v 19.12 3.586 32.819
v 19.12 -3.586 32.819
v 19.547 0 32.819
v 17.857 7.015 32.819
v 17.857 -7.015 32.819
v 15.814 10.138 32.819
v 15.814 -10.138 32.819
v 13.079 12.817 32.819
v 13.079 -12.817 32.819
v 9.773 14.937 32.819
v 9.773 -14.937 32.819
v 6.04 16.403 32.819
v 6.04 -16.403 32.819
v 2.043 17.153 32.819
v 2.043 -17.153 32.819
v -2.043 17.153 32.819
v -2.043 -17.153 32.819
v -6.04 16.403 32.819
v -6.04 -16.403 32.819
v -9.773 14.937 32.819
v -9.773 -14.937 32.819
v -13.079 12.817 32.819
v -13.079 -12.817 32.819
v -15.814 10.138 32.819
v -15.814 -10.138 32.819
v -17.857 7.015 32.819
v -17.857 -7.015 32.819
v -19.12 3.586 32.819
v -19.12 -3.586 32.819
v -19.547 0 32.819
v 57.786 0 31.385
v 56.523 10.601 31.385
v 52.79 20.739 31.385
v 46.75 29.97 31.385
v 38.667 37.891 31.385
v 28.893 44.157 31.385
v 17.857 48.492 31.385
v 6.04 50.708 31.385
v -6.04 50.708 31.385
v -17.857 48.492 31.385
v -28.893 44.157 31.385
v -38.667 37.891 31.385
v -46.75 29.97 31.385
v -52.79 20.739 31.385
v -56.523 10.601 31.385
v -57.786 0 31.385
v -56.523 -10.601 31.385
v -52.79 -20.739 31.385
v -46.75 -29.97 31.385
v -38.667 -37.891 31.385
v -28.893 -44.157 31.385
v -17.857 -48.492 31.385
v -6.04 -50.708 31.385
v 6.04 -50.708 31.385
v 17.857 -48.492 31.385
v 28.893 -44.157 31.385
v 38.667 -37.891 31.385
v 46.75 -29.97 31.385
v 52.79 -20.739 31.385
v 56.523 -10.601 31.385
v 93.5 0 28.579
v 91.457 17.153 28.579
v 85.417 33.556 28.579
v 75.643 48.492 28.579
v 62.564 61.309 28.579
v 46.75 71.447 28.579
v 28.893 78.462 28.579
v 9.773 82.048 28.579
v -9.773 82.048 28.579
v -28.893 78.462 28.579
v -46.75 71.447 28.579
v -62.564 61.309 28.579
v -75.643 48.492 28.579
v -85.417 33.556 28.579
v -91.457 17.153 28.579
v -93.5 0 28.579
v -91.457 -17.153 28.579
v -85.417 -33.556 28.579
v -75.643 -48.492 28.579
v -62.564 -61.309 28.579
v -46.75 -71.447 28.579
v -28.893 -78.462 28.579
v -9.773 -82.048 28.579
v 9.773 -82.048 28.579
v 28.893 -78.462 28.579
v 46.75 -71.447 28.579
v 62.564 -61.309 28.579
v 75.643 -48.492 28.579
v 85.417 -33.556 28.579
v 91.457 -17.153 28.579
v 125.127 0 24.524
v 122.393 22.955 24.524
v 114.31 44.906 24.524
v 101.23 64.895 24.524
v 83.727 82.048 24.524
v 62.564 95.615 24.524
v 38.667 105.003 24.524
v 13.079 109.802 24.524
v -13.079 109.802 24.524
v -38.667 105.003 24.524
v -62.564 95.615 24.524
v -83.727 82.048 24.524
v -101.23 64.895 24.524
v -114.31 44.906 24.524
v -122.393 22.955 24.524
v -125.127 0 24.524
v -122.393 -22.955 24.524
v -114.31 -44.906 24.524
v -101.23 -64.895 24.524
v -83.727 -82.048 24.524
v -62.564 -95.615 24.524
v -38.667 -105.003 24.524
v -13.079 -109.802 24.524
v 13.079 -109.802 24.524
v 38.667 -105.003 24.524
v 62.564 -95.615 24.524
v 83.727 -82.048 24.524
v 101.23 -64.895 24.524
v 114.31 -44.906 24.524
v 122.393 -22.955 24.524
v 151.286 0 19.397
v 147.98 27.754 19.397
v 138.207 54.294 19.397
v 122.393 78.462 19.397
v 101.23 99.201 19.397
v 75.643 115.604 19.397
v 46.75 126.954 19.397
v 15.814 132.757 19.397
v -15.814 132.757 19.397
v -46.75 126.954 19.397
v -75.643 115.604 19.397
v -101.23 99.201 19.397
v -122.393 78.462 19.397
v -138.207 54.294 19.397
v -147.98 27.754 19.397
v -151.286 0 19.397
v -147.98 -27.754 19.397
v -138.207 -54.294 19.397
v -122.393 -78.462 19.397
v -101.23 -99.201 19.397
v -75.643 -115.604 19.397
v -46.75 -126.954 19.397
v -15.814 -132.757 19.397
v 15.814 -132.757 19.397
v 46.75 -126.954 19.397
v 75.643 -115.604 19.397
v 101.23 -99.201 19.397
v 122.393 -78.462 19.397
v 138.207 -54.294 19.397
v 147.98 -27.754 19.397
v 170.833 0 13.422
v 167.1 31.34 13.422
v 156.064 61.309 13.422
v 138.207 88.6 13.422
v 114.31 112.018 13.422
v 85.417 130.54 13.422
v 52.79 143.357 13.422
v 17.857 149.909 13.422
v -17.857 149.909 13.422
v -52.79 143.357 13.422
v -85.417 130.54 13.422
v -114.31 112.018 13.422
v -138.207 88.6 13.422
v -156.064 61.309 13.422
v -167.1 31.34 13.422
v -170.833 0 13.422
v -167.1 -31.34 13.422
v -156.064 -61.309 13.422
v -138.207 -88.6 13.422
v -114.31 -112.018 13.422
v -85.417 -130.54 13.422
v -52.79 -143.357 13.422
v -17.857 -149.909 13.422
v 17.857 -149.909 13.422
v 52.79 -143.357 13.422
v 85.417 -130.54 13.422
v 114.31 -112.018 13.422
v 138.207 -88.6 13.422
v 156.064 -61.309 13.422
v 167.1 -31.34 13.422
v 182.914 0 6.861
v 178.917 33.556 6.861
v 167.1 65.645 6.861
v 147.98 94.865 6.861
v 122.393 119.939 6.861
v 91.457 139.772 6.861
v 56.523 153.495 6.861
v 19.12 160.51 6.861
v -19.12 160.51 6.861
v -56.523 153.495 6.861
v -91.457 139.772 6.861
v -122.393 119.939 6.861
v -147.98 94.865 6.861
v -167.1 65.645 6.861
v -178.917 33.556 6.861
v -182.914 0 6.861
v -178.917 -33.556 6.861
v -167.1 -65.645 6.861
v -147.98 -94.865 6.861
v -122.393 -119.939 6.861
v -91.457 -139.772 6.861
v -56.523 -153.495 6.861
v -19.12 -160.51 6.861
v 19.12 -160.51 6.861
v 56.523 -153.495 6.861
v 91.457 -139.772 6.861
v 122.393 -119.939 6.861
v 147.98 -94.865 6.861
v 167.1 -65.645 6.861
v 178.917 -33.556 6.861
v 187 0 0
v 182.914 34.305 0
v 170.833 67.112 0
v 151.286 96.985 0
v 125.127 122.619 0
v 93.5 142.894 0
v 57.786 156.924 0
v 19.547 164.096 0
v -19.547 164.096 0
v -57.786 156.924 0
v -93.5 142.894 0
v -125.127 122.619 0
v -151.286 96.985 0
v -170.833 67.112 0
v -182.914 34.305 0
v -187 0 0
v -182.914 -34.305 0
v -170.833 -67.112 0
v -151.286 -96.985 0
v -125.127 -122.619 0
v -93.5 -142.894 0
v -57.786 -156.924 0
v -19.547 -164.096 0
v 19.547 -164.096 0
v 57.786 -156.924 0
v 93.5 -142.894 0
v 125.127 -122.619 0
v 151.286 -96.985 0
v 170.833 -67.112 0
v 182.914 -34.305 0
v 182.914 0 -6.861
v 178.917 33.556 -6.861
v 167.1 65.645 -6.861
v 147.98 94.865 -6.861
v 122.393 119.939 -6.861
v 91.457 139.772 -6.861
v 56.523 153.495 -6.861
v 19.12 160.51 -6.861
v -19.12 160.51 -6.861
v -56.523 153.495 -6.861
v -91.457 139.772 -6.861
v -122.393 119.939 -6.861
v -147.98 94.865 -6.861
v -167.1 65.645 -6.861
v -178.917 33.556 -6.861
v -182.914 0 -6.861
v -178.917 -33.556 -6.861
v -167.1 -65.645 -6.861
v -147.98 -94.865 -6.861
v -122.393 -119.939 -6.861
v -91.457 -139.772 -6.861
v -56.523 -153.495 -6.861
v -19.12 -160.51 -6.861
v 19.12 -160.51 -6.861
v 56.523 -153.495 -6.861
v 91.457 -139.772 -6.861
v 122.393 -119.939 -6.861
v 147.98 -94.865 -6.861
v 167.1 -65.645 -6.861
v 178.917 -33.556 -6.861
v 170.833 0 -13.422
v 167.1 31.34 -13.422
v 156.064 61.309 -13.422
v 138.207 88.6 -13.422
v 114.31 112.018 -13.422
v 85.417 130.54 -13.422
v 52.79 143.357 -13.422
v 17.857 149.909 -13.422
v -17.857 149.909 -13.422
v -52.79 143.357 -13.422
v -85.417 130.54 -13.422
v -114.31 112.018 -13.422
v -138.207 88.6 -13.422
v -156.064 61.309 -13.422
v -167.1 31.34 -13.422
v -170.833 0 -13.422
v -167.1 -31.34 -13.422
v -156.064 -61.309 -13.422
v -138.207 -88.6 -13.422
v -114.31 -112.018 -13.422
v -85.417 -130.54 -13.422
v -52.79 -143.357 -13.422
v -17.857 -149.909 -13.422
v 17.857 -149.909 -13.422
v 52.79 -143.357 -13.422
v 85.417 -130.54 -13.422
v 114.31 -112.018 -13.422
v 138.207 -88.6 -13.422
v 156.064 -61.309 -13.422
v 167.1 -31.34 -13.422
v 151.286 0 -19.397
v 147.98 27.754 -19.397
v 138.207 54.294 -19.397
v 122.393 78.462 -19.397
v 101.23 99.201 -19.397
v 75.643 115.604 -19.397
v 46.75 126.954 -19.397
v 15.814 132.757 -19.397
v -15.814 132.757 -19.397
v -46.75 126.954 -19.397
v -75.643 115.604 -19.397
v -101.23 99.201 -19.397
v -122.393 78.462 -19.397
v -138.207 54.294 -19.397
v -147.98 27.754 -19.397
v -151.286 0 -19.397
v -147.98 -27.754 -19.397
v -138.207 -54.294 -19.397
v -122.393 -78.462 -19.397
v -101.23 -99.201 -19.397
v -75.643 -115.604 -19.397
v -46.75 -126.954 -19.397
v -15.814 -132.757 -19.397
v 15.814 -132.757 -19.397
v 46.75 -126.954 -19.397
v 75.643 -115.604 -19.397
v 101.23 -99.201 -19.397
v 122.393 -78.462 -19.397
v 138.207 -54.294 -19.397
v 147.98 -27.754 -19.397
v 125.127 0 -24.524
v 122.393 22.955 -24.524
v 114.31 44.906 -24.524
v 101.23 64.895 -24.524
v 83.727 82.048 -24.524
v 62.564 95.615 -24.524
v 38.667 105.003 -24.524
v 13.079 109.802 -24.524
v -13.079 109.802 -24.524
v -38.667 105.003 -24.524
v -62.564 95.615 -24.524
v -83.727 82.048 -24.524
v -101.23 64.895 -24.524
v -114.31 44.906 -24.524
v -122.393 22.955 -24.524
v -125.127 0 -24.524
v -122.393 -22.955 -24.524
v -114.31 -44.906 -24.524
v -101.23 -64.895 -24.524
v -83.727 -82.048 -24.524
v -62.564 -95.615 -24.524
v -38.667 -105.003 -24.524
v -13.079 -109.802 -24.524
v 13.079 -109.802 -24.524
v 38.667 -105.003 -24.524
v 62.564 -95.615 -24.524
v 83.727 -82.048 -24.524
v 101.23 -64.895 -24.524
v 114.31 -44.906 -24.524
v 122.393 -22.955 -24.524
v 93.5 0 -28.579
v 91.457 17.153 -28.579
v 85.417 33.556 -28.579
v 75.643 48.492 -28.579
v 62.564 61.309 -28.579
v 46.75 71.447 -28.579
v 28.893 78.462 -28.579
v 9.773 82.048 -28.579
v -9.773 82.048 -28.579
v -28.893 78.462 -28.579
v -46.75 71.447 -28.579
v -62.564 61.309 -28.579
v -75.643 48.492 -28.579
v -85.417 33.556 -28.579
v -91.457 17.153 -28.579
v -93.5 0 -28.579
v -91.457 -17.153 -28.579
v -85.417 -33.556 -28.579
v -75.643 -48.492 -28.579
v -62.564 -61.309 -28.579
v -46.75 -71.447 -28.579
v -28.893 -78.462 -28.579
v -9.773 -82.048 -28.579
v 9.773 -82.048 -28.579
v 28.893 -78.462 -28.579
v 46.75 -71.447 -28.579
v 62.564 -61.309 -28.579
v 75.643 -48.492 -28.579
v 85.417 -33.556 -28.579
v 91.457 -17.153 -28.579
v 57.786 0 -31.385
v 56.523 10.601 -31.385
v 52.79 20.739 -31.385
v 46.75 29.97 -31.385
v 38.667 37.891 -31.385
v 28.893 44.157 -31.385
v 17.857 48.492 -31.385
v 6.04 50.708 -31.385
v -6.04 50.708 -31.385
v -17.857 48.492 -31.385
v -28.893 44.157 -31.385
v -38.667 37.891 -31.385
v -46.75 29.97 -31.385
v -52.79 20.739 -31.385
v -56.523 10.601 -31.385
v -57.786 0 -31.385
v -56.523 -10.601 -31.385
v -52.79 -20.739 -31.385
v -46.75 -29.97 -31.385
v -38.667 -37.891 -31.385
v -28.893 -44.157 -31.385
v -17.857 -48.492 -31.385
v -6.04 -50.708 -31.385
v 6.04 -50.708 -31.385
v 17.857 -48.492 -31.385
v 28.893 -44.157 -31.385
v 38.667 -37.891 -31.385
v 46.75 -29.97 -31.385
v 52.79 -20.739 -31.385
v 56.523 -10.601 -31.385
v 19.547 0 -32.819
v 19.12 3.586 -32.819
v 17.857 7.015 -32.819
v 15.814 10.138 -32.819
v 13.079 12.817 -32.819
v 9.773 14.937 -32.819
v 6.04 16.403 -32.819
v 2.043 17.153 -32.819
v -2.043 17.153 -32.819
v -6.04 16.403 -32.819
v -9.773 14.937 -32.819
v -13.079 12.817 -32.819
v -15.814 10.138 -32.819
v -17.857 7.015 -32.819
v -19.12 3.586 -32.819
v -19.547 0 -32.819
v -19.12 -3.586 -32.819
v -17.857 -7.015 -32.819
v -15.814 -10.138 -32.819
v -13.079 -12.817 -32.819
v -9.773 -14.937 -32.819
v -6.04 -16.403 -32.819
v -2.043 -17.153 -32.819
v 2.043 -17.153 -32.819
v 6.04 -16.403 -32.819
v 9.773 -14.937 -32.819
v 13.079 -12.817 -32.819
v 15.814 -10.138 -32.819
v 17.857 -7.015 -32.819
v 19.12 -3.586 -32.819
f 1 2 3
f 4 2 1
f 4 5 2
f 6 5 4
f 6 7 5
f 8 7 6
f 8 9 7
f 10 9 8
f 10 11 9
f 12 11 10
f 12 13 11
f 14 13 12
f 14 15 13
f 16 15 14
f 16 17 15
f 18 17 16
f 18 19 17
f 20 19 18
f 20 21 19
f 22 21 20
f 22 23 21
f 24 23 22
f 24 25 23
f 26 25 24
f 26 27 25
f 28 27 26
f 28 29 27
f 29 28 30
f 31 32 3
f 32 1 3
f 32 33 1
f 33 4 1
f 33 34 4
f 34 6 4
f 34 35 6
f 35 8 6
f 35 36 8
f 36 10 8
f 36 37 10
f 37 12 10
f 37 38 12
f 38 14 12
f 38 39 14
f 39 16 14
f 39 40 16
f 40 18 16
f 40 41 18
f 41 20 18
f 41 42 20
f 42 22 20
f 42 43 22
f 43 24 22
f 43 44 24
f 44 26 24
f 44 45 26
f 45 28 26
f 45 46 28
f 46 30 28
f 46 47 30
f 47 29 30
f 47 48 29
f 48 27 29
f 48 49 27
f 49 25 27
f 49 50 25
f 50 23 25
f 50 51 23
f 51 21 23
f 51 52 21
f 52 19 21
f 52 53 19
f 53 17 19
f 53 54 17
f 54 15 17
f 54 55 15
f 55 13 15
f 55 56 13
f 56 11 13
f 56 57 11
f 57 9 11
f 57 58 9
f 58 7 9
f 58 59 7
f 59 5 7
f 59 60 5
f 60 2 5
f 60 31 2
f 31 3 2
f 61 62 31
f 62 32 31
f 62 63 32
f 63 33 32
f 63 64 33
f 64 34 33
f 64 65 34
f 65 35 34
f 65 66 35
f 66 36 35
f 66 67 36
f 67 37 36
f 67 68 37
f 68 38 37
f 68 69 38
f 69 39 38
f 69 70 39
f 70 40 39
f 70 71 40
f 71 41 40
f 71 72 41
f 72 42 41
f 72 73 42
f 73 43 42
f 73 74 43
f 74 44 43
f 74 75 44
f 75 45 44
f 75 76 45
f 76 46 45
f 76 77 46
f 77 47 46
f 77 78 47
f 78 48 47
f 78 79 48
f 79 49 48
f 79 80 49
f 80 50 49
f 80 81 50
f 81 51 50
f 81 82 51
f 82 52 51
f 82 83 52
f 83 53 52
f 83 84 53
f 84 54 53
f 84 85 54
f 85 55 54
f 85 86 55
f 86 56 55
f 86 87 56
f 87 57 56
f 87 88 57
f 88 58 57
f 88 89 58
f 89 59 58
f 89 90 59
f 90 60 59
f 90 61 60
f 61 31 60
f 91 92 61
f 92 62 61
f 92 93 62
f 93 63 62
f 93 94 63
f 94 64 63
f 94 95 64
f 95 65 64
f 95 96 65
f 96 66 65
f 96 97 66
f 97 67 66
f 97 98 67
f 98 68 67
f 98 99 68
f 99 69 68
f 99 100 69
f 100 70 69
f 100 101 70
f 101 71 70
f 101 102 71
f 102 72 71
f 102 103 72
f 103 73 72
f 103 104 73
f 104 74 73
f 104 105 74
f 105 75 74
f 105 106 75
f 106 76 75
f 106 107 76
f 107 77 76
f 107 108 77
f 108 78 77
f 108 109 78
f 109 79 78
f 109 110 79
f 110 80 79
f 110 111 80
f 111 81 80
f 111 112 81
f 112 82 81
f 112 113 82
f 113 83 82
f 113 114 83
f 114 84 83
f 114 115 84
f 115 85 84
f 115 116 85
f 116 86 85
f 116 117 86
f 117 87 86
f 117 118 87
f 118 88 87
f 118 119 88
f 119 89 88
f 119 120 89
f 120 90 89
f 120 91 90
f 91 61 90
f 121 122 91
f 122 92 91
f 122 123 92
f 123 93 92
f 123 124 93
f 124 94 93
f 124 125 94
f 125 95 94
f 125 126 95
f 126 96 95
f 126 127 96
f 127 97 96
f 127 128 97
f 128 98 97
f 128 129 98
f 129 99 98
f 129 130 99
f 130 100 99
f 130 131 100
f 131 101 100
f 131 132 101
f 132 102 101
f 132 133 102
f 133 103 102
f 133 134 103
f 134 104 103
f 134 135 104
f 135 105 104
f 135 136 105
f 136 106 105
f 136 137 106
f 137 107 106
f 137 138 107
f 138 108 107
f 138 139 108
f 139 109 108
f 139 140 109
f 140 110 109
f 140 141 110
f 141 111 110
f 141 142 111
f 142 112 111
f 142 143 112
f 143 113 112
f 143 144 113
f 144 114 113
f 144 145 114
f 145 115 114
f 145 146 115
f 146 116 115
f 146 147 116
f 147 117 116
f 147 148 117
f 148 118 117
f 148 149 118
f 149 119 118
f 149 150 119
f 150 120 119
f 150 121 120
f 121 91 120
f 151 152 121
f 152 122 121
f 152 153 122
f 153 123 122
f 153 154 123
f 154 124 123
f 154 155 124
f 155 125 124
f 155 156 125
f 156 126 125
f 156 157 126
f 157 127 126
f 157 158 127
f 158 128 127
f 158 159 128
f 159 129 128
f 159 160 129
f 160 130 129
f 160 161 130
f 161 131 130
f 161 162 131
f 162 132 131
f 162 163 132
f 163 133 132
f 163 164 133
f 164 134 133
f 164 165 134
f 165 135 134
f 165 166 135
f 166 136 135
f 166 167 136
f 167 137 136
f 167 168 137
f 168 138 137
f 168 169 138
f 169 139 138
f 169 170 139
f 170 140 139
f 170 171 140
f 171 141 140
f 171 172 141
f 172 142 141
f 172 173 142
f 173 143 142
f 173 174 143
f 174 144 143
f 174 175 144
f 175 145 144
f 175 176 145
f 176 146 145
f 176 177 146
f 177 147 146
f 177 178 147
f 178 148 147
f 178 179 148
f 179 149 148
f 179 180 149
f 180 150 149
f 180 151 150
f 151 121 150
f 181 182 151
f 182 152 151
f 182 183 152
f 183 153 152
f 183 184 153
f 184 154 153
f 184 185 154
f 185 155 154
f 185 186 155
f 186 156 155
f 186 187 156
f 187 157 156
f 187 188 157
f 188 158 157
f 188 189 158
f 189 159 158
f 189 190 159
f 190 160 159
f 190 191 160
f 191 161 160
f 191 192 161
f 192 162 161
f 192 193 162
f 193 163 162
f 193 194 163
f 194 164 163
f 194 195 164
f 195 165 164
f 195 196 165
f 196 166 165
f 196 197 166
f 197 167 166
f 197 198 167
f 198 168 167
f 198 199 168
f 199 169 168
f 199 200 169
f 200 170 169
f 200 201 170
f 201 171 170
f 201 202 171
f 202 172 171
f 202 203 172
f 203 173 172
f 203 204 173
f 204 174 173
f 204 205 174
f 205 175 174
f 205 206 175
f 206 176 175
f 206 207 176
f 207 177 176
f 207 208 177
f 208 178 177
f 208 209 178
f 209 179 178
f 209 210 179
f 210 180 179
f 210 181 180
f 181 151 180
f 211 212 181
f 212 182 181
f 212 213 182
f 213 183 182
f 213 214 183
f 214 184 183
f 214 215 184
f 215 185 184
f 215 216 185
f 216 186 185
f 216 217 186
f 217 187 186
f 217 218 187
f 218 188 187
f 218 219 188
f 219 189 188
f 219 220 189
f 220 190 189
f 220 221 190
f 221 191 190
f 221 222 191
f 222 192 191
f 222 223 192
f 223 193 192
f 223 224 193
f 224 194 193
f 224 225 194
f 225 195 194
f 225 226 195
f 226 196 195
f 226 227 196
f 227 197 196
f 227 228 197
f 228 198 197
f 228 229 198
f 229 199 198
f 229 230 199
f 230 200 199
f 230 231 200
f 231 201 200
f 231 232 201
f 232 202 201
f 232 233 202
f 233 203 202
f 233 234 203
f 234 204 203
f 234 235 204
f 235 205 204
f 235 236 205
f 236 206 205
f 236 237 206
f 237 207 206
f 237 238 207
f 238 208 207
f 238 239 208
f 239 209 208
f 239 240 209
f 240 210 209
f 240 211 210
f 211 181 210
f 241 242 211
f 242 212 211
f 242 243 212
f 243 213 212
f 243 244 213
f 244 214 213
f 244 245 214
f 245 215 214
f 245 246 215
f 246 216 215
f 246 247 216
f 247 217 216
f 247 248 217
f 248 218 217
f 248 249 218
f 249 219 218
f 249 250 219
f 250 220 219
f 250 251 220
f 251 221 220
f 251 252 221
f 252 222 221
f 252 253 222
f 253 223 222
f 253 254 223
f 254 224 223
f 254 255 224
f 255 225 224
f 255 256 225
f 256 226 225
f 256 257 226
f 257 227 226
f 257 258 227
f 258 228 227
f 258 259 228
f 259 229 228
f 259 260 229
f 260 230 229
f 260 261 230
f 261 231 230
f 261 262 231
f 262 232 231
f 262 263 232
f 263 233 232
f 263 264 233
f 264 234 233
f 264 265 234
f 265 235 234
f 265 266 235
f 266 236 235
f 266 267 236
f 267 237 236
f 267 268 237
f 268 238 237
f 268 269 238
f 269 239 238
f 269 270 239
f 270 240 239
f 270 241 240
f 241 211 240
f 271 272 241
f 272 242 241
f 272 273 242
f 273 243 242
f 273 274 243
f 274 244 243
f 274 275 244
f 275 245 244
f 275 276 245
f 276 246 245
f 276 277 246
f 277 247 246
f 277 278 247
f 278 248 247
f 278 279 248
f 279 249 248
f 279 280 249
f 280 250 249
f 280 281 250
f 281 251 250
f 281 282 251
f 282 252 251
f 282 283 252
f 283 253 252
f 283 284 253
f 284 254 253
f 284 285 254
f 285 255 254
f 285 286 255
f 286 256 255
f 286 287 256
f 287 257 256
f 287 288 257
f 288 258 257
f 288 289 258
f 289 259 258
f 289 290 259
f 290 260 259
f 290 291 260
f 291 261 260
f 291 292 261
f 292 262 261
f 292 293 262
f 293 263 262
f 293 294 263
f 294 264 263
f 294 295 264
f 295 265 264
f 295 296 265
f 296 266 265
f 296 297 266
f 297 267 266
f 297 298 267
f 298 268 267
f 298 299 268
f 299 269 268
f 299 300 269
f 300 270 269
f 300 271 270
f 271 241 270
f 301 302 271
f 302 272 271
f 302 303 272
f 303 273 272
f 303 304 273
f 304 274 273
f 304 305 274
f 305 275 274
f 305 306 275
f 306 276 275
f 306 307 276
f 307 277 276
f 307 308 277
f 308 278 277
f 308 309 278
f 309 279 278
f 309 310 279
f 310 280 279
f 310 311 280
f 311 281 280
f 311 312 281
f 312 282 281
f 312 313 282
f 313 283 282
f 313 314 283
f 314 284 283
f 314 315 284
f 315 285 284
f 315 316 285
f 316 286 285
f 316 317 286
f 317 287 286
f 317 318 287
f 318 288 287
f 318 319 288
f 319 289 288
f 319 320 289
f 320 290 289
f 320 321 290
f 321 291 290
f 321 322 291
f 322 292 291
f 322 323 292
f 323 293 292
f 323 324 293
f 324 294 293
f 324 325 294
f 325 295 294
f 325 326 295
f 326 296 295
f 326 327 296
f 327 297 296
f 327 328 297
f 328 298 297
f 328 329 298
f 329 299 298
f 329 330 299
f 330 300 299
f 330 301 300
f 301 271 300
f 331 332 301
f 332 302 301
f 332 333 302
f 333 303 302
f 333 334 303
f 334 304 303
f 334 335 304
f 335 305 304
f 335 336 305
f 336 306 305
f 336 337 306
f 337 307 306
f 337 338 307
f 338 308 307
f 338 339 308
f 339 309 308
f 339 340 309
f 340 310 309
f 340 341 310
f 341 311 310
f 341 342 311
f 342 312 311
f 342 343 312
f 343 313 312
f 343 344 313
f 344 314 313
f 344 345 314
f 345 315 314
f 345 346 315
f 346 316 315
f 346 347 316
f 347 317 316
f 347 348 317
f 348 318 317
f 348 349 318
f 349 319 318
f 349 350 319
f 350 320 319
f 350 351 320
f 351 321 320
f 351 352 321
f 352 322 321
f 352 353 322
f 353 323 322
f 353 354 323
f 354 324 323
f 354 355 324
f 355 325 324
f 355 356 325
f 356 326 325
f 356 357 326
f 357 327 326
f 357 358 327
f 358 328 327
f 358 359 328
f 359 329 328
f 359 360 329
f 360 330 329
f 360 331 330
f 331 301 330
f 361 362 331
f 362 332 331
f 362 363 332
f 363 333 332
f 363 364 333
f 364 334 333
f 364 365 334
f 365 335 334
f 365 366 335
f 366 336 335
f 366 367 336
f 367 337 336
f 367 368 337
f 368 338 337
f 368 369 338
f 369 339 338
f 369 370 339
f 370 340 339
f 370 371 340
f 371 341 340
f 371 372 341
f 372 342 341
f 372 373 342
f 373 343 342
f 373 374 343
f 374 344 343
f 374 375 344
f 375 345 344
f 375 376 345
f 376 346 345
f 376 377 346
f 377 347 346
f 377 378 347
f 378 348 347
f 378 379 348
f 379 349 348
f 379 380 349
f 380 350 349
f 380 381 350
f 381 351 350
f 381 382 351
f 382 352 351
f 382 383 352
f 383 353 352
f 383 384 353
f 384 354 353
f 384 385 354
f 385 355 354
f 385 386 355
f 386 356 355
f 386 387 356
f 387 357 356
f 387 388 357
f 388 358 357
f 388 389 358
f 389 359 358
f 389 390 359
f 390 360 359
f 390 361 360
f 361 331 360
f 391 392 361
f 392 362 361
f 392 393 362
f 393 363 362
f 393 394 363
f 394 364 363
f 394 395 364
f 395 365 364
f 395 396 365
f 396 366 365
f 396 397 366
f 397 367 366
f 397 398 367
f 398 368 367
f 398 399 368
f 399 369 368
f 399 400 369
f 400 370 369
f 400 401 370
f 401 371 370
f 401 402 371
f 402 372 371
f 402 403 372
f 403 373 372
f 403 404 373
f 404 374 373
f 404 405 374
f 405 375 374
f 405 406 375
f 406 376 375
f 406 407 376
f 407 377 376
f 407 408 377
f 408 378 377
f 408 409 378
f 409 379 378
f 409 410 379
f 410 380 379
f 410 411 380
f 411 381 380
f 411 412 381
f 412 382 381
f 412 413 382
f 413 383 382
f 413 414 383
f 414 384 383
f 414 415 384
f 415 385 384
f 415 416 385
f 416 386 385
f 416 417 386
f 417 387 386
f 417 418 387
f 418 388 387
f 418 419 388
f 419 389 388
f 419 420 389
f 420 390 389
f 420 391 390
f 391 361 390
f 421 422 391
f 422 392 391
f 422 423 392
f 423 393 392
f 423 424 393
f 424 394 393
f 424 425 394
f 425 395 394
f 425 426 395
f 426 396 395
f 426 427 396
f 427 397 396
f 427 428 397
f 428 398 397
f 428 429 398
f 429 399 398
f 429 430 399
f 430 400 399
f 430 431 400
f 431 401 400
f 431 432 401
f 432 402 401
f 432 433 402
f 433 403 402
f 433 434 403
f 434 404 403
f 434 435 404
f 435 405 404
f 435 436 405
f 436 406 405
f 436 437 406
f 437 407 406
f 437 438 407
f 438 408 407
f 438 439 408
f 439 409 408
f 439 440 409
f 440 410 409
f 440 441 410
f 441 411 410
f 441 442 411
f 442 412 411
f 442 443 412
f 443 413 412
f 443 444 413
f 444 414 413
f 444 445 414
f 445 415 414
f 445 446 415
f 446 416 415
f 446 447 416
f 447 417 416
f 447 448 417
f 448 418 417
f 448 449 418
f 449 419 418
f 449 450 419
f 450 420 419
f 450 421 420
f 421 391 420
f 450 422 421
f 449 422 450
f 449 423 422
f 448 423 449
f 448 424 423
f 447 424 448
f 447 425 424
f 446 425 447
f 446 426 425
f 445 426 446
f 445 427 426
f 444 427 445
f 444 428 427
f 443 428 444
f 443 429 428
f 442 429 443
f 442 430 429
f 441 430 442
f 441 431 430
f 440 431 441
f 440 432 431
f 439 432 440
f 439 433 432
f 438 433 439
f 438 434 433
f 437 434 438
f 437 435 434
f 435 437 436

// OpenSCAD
// Generated by SolidPython 1.0.1 on 2020-07-29 00:46:53


scale(v = [17, 15, 3]) {
	sphere(r = 11);
}
/***********************************************
*********      SolidPython code:      **********
************************************************
 
# import packages: SolidPython
from solid import *
from solid.utils import *
from itertools import chain, combinations, permutations


class Resize:

    def __init__(self, scad_file):
        self.scad_file = scad_file
        #self.scad_file = import_scad(scad_file)
        # cone/cylinder param:
        self.r1 = 0
        self.r2 = 0
        self.h = 0
        # rectangular prism param:
        self.w = 0
        self.l = 0
        # ellipse param:
        self.r = 0

    # import OpenScad code (file name corresponds to shape)


    # classify shape + parameters
    def assign(self, param1, param2, param3):
        if self.scad_file == 'cone.scad':
            self.r1 = param1
            self.r2 = param2
            self.h = param3
        elif self.scad_file == 'cylinder.scad':
            self.r1 = param1
            self.r2 = param2
            self.h = param3
        elif self.scad_file == 'rectangularPrism.scad':
            self.h = param1
            self.l = param2
            self.w = param3
        else:
            self.r = param1
            self.h = param2

    # resize parameters
    def iterate(self):
        x = range(3, 20, 2)
        i = 1
        if self.scad_file == 'cone.scad':
            tempList = list(permutations(x, 2))
            for temp in tempList:
                param1 = temp[0]
                param2 = temp[1]
                filepath = 'produced_scad_files/' + 'cone' + str(param1) + '_' + str(param2) + '_' + '.scad'
                scad_render_to_file(cylinder(h=param1, r1=param2, r2=0), filepath)

        elif self.scad_file == 'cylinder.scad':
            tempList = list(permutations(x, 3))
            for temp in tempList:
                param1 = temp[0]
                param2 = temp[1]
                filepath = 'produced_scad_files/' + 'cylinder' + str(param1) + '_' + str(param2) + '_' + '.scad'
                scad_render_to_file(cylinder(h=param1, r1=param2, r2=param2), filepath)

        elif self.scad_file == 'rectangularPrism.scad':
            tempList = list(permutations(x, 3))
            for temp in tempList:
                param1 = temp[0]
                param2 = temp[1]
                param3 = temp[2]
                filepath = 'produced_scad_files/' + 'rectangularPrism' + str(param1) + '_' + str(param2) + '_' + str(
                    param3) + '.scad'
                scad_render_to_file(cube(size=(param1, param2, param3)), filepath)

        elif self.scad_file == 'ellipse.scad':
            tempList = list(permutations(x, 4))
            for temp in tempList:
                param1 = temp[0]
                param2 = temp[1]
                param3 = temp[2]
                param4 = temp[3]
                filepath = 'produced_scad_files/' + 'ellipse' + str(param1) + '_' + str(param2) + '_' + str(param3) + '_' + str(param4) + '.scad'
                scad_render_to_file(scale([param1, param2, param3])(sphere(r=param4)), filepath)

    def render_to_scadfile(self):
        scad_render_to_file(scad, 'example.scad') 
 
************************************************/
